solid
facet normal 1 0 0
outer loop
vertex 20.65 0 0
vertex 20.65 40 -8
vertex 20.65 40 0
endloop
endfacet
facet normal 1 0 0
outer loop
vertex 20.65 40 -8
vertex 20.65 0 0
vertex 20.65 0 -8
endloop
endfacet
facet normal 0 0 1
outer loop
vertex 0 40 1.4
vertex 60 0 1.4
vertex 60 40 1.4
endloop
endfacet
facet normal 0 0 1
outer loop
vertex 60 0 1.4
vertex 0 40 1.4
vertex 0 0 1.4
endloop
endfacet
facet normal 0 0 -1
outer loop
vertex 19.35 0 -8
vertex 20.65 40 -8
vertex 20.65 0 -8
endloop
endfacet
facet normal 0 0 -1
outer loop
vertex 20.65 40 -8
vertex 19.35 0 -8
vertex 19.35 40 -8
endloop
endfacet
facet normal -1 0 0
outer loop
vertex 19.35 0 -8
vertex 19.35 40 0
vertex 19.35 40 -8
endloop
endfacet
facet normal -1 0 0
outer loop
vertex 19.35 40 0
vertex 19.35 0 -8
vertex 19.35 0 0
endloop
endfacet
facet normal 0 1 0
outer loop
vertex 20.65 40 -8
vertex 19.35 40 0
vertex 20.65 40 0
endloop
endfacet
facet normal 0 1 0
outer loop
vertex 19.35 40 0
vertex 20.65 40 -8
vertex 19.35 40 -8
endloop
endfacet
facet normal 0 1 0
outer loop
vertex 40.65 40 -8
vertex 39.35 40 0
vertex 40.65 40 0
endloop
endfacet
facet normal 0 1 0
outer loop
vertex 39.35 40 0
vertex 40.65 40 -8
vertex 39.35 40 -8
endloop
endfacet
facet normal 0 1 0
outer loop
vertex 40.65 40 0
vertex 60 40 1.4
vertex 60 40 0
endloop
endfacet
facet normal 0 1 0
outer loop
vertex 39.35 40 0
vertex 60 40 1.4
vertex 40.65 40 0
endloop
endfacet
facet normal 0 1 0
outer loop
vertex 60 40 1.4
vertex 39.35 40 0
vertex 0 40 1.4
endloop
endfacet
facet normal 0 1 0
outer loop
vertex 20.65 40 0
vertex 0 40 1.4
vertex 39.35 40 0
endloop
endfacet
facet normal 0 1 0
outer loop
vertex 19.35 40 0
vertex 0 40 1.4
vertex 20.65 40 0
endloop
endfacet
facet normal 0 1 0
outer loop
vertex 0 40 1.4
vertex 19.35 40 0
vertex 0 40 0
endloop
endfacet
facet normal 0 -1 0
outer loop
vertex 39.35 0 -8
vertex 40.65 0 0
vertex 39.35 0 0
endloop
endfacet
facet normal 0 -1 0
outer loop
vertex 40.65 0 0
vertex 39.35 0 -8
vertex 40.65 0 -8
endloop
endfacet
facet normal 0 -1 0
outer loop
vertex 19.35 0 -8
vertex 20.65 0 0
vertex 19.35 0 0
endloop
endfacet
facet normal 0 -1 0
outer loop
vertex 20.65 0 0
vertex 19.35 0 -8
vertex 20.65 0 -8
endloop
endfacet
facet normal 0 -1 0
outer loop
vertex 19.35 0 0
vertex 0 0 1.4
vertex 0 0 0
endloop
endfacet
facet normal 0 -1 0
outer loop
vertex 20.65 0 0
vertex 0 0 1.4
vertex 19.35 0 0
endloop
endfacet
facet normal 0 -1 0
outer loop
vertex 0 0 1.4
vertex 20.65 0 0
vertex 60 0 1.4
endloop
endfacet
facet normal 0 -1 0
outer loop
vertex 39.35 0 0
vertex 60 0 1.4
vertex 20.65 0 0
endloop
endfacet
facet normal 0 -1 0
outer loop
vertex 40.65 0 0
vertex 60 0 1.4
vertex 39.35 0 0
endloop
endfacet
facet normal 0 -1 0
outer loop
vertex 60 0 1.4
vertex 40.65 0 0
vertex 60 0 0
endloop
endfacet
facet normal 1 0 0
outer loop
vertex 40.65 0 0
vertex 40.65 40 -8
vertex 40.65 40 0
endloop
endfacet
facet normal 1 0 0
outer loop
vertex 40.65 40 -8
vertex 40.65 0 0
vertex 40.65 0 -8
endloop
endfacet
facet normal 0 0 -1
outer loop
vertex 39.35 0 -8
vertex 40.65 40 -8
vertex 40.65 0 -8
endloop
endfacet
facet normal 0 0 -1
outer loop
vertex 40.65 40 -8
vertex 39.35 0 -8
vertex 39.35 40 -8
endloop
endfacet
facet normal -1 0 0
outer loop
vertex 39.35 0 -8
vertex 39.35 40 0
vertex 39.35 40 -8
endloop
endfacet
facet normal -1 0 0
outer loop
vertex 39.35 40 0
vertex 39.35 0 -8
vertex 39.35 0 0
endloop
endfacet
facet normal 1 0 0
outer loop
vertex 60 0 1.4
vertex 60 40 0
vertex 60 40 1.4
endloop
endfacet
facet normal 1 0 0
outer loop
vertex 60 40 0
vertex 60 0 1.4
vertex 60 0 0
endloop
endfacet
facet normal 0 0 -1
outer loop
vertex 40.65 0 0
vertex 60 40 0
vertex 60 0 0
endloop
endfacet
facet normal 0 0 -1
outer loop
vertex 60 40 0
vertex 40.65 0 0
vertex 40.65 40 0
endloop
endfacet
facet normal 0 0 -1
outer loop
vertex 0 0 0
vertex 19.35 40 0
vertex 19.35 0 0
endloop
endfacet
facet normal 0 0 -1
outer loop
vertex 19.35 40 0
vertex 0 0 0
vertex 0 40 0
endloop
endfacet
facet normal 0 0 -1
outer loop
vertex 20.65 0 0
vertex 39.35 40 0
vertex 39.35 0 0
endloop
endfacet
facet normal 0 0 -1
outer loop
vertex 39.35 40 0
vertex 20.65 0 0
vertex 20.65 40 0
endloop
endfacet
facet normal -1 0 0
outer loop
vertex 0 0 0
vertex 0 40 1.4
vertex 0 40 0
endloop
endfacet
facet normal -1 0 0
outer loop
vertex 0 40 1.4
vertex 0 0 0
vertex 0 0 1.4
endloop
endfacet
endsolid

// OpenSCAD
$fn = 32;

// ----------------------------------------------------------------------
// Ribbed panel: 1.4 mm panel
// ----------------------------------------------------------------------

// --- parameters (mm) ---
panel_l = 60;             // panel length, X
panel_w = 40;             // panel width, Y
panel_t = 1.4;            // panel thickness, Z
rib_t = 1.3;              // rib thickness
rib_h = 8;                // rib height below the panel
ribs = 2;                 // number of ribs

total_h = panel_t + rib_h;  // overall height

union() {
  cube([panel_l, panel_w, panel_t]);
  for (i = [1 : ribs])
    translate([i * panel_l / (ribs + 1) - rib_t / 2, 0, -rib_h])
      cube([rib_t, panel_w, rib_h + panel_t]);
}
